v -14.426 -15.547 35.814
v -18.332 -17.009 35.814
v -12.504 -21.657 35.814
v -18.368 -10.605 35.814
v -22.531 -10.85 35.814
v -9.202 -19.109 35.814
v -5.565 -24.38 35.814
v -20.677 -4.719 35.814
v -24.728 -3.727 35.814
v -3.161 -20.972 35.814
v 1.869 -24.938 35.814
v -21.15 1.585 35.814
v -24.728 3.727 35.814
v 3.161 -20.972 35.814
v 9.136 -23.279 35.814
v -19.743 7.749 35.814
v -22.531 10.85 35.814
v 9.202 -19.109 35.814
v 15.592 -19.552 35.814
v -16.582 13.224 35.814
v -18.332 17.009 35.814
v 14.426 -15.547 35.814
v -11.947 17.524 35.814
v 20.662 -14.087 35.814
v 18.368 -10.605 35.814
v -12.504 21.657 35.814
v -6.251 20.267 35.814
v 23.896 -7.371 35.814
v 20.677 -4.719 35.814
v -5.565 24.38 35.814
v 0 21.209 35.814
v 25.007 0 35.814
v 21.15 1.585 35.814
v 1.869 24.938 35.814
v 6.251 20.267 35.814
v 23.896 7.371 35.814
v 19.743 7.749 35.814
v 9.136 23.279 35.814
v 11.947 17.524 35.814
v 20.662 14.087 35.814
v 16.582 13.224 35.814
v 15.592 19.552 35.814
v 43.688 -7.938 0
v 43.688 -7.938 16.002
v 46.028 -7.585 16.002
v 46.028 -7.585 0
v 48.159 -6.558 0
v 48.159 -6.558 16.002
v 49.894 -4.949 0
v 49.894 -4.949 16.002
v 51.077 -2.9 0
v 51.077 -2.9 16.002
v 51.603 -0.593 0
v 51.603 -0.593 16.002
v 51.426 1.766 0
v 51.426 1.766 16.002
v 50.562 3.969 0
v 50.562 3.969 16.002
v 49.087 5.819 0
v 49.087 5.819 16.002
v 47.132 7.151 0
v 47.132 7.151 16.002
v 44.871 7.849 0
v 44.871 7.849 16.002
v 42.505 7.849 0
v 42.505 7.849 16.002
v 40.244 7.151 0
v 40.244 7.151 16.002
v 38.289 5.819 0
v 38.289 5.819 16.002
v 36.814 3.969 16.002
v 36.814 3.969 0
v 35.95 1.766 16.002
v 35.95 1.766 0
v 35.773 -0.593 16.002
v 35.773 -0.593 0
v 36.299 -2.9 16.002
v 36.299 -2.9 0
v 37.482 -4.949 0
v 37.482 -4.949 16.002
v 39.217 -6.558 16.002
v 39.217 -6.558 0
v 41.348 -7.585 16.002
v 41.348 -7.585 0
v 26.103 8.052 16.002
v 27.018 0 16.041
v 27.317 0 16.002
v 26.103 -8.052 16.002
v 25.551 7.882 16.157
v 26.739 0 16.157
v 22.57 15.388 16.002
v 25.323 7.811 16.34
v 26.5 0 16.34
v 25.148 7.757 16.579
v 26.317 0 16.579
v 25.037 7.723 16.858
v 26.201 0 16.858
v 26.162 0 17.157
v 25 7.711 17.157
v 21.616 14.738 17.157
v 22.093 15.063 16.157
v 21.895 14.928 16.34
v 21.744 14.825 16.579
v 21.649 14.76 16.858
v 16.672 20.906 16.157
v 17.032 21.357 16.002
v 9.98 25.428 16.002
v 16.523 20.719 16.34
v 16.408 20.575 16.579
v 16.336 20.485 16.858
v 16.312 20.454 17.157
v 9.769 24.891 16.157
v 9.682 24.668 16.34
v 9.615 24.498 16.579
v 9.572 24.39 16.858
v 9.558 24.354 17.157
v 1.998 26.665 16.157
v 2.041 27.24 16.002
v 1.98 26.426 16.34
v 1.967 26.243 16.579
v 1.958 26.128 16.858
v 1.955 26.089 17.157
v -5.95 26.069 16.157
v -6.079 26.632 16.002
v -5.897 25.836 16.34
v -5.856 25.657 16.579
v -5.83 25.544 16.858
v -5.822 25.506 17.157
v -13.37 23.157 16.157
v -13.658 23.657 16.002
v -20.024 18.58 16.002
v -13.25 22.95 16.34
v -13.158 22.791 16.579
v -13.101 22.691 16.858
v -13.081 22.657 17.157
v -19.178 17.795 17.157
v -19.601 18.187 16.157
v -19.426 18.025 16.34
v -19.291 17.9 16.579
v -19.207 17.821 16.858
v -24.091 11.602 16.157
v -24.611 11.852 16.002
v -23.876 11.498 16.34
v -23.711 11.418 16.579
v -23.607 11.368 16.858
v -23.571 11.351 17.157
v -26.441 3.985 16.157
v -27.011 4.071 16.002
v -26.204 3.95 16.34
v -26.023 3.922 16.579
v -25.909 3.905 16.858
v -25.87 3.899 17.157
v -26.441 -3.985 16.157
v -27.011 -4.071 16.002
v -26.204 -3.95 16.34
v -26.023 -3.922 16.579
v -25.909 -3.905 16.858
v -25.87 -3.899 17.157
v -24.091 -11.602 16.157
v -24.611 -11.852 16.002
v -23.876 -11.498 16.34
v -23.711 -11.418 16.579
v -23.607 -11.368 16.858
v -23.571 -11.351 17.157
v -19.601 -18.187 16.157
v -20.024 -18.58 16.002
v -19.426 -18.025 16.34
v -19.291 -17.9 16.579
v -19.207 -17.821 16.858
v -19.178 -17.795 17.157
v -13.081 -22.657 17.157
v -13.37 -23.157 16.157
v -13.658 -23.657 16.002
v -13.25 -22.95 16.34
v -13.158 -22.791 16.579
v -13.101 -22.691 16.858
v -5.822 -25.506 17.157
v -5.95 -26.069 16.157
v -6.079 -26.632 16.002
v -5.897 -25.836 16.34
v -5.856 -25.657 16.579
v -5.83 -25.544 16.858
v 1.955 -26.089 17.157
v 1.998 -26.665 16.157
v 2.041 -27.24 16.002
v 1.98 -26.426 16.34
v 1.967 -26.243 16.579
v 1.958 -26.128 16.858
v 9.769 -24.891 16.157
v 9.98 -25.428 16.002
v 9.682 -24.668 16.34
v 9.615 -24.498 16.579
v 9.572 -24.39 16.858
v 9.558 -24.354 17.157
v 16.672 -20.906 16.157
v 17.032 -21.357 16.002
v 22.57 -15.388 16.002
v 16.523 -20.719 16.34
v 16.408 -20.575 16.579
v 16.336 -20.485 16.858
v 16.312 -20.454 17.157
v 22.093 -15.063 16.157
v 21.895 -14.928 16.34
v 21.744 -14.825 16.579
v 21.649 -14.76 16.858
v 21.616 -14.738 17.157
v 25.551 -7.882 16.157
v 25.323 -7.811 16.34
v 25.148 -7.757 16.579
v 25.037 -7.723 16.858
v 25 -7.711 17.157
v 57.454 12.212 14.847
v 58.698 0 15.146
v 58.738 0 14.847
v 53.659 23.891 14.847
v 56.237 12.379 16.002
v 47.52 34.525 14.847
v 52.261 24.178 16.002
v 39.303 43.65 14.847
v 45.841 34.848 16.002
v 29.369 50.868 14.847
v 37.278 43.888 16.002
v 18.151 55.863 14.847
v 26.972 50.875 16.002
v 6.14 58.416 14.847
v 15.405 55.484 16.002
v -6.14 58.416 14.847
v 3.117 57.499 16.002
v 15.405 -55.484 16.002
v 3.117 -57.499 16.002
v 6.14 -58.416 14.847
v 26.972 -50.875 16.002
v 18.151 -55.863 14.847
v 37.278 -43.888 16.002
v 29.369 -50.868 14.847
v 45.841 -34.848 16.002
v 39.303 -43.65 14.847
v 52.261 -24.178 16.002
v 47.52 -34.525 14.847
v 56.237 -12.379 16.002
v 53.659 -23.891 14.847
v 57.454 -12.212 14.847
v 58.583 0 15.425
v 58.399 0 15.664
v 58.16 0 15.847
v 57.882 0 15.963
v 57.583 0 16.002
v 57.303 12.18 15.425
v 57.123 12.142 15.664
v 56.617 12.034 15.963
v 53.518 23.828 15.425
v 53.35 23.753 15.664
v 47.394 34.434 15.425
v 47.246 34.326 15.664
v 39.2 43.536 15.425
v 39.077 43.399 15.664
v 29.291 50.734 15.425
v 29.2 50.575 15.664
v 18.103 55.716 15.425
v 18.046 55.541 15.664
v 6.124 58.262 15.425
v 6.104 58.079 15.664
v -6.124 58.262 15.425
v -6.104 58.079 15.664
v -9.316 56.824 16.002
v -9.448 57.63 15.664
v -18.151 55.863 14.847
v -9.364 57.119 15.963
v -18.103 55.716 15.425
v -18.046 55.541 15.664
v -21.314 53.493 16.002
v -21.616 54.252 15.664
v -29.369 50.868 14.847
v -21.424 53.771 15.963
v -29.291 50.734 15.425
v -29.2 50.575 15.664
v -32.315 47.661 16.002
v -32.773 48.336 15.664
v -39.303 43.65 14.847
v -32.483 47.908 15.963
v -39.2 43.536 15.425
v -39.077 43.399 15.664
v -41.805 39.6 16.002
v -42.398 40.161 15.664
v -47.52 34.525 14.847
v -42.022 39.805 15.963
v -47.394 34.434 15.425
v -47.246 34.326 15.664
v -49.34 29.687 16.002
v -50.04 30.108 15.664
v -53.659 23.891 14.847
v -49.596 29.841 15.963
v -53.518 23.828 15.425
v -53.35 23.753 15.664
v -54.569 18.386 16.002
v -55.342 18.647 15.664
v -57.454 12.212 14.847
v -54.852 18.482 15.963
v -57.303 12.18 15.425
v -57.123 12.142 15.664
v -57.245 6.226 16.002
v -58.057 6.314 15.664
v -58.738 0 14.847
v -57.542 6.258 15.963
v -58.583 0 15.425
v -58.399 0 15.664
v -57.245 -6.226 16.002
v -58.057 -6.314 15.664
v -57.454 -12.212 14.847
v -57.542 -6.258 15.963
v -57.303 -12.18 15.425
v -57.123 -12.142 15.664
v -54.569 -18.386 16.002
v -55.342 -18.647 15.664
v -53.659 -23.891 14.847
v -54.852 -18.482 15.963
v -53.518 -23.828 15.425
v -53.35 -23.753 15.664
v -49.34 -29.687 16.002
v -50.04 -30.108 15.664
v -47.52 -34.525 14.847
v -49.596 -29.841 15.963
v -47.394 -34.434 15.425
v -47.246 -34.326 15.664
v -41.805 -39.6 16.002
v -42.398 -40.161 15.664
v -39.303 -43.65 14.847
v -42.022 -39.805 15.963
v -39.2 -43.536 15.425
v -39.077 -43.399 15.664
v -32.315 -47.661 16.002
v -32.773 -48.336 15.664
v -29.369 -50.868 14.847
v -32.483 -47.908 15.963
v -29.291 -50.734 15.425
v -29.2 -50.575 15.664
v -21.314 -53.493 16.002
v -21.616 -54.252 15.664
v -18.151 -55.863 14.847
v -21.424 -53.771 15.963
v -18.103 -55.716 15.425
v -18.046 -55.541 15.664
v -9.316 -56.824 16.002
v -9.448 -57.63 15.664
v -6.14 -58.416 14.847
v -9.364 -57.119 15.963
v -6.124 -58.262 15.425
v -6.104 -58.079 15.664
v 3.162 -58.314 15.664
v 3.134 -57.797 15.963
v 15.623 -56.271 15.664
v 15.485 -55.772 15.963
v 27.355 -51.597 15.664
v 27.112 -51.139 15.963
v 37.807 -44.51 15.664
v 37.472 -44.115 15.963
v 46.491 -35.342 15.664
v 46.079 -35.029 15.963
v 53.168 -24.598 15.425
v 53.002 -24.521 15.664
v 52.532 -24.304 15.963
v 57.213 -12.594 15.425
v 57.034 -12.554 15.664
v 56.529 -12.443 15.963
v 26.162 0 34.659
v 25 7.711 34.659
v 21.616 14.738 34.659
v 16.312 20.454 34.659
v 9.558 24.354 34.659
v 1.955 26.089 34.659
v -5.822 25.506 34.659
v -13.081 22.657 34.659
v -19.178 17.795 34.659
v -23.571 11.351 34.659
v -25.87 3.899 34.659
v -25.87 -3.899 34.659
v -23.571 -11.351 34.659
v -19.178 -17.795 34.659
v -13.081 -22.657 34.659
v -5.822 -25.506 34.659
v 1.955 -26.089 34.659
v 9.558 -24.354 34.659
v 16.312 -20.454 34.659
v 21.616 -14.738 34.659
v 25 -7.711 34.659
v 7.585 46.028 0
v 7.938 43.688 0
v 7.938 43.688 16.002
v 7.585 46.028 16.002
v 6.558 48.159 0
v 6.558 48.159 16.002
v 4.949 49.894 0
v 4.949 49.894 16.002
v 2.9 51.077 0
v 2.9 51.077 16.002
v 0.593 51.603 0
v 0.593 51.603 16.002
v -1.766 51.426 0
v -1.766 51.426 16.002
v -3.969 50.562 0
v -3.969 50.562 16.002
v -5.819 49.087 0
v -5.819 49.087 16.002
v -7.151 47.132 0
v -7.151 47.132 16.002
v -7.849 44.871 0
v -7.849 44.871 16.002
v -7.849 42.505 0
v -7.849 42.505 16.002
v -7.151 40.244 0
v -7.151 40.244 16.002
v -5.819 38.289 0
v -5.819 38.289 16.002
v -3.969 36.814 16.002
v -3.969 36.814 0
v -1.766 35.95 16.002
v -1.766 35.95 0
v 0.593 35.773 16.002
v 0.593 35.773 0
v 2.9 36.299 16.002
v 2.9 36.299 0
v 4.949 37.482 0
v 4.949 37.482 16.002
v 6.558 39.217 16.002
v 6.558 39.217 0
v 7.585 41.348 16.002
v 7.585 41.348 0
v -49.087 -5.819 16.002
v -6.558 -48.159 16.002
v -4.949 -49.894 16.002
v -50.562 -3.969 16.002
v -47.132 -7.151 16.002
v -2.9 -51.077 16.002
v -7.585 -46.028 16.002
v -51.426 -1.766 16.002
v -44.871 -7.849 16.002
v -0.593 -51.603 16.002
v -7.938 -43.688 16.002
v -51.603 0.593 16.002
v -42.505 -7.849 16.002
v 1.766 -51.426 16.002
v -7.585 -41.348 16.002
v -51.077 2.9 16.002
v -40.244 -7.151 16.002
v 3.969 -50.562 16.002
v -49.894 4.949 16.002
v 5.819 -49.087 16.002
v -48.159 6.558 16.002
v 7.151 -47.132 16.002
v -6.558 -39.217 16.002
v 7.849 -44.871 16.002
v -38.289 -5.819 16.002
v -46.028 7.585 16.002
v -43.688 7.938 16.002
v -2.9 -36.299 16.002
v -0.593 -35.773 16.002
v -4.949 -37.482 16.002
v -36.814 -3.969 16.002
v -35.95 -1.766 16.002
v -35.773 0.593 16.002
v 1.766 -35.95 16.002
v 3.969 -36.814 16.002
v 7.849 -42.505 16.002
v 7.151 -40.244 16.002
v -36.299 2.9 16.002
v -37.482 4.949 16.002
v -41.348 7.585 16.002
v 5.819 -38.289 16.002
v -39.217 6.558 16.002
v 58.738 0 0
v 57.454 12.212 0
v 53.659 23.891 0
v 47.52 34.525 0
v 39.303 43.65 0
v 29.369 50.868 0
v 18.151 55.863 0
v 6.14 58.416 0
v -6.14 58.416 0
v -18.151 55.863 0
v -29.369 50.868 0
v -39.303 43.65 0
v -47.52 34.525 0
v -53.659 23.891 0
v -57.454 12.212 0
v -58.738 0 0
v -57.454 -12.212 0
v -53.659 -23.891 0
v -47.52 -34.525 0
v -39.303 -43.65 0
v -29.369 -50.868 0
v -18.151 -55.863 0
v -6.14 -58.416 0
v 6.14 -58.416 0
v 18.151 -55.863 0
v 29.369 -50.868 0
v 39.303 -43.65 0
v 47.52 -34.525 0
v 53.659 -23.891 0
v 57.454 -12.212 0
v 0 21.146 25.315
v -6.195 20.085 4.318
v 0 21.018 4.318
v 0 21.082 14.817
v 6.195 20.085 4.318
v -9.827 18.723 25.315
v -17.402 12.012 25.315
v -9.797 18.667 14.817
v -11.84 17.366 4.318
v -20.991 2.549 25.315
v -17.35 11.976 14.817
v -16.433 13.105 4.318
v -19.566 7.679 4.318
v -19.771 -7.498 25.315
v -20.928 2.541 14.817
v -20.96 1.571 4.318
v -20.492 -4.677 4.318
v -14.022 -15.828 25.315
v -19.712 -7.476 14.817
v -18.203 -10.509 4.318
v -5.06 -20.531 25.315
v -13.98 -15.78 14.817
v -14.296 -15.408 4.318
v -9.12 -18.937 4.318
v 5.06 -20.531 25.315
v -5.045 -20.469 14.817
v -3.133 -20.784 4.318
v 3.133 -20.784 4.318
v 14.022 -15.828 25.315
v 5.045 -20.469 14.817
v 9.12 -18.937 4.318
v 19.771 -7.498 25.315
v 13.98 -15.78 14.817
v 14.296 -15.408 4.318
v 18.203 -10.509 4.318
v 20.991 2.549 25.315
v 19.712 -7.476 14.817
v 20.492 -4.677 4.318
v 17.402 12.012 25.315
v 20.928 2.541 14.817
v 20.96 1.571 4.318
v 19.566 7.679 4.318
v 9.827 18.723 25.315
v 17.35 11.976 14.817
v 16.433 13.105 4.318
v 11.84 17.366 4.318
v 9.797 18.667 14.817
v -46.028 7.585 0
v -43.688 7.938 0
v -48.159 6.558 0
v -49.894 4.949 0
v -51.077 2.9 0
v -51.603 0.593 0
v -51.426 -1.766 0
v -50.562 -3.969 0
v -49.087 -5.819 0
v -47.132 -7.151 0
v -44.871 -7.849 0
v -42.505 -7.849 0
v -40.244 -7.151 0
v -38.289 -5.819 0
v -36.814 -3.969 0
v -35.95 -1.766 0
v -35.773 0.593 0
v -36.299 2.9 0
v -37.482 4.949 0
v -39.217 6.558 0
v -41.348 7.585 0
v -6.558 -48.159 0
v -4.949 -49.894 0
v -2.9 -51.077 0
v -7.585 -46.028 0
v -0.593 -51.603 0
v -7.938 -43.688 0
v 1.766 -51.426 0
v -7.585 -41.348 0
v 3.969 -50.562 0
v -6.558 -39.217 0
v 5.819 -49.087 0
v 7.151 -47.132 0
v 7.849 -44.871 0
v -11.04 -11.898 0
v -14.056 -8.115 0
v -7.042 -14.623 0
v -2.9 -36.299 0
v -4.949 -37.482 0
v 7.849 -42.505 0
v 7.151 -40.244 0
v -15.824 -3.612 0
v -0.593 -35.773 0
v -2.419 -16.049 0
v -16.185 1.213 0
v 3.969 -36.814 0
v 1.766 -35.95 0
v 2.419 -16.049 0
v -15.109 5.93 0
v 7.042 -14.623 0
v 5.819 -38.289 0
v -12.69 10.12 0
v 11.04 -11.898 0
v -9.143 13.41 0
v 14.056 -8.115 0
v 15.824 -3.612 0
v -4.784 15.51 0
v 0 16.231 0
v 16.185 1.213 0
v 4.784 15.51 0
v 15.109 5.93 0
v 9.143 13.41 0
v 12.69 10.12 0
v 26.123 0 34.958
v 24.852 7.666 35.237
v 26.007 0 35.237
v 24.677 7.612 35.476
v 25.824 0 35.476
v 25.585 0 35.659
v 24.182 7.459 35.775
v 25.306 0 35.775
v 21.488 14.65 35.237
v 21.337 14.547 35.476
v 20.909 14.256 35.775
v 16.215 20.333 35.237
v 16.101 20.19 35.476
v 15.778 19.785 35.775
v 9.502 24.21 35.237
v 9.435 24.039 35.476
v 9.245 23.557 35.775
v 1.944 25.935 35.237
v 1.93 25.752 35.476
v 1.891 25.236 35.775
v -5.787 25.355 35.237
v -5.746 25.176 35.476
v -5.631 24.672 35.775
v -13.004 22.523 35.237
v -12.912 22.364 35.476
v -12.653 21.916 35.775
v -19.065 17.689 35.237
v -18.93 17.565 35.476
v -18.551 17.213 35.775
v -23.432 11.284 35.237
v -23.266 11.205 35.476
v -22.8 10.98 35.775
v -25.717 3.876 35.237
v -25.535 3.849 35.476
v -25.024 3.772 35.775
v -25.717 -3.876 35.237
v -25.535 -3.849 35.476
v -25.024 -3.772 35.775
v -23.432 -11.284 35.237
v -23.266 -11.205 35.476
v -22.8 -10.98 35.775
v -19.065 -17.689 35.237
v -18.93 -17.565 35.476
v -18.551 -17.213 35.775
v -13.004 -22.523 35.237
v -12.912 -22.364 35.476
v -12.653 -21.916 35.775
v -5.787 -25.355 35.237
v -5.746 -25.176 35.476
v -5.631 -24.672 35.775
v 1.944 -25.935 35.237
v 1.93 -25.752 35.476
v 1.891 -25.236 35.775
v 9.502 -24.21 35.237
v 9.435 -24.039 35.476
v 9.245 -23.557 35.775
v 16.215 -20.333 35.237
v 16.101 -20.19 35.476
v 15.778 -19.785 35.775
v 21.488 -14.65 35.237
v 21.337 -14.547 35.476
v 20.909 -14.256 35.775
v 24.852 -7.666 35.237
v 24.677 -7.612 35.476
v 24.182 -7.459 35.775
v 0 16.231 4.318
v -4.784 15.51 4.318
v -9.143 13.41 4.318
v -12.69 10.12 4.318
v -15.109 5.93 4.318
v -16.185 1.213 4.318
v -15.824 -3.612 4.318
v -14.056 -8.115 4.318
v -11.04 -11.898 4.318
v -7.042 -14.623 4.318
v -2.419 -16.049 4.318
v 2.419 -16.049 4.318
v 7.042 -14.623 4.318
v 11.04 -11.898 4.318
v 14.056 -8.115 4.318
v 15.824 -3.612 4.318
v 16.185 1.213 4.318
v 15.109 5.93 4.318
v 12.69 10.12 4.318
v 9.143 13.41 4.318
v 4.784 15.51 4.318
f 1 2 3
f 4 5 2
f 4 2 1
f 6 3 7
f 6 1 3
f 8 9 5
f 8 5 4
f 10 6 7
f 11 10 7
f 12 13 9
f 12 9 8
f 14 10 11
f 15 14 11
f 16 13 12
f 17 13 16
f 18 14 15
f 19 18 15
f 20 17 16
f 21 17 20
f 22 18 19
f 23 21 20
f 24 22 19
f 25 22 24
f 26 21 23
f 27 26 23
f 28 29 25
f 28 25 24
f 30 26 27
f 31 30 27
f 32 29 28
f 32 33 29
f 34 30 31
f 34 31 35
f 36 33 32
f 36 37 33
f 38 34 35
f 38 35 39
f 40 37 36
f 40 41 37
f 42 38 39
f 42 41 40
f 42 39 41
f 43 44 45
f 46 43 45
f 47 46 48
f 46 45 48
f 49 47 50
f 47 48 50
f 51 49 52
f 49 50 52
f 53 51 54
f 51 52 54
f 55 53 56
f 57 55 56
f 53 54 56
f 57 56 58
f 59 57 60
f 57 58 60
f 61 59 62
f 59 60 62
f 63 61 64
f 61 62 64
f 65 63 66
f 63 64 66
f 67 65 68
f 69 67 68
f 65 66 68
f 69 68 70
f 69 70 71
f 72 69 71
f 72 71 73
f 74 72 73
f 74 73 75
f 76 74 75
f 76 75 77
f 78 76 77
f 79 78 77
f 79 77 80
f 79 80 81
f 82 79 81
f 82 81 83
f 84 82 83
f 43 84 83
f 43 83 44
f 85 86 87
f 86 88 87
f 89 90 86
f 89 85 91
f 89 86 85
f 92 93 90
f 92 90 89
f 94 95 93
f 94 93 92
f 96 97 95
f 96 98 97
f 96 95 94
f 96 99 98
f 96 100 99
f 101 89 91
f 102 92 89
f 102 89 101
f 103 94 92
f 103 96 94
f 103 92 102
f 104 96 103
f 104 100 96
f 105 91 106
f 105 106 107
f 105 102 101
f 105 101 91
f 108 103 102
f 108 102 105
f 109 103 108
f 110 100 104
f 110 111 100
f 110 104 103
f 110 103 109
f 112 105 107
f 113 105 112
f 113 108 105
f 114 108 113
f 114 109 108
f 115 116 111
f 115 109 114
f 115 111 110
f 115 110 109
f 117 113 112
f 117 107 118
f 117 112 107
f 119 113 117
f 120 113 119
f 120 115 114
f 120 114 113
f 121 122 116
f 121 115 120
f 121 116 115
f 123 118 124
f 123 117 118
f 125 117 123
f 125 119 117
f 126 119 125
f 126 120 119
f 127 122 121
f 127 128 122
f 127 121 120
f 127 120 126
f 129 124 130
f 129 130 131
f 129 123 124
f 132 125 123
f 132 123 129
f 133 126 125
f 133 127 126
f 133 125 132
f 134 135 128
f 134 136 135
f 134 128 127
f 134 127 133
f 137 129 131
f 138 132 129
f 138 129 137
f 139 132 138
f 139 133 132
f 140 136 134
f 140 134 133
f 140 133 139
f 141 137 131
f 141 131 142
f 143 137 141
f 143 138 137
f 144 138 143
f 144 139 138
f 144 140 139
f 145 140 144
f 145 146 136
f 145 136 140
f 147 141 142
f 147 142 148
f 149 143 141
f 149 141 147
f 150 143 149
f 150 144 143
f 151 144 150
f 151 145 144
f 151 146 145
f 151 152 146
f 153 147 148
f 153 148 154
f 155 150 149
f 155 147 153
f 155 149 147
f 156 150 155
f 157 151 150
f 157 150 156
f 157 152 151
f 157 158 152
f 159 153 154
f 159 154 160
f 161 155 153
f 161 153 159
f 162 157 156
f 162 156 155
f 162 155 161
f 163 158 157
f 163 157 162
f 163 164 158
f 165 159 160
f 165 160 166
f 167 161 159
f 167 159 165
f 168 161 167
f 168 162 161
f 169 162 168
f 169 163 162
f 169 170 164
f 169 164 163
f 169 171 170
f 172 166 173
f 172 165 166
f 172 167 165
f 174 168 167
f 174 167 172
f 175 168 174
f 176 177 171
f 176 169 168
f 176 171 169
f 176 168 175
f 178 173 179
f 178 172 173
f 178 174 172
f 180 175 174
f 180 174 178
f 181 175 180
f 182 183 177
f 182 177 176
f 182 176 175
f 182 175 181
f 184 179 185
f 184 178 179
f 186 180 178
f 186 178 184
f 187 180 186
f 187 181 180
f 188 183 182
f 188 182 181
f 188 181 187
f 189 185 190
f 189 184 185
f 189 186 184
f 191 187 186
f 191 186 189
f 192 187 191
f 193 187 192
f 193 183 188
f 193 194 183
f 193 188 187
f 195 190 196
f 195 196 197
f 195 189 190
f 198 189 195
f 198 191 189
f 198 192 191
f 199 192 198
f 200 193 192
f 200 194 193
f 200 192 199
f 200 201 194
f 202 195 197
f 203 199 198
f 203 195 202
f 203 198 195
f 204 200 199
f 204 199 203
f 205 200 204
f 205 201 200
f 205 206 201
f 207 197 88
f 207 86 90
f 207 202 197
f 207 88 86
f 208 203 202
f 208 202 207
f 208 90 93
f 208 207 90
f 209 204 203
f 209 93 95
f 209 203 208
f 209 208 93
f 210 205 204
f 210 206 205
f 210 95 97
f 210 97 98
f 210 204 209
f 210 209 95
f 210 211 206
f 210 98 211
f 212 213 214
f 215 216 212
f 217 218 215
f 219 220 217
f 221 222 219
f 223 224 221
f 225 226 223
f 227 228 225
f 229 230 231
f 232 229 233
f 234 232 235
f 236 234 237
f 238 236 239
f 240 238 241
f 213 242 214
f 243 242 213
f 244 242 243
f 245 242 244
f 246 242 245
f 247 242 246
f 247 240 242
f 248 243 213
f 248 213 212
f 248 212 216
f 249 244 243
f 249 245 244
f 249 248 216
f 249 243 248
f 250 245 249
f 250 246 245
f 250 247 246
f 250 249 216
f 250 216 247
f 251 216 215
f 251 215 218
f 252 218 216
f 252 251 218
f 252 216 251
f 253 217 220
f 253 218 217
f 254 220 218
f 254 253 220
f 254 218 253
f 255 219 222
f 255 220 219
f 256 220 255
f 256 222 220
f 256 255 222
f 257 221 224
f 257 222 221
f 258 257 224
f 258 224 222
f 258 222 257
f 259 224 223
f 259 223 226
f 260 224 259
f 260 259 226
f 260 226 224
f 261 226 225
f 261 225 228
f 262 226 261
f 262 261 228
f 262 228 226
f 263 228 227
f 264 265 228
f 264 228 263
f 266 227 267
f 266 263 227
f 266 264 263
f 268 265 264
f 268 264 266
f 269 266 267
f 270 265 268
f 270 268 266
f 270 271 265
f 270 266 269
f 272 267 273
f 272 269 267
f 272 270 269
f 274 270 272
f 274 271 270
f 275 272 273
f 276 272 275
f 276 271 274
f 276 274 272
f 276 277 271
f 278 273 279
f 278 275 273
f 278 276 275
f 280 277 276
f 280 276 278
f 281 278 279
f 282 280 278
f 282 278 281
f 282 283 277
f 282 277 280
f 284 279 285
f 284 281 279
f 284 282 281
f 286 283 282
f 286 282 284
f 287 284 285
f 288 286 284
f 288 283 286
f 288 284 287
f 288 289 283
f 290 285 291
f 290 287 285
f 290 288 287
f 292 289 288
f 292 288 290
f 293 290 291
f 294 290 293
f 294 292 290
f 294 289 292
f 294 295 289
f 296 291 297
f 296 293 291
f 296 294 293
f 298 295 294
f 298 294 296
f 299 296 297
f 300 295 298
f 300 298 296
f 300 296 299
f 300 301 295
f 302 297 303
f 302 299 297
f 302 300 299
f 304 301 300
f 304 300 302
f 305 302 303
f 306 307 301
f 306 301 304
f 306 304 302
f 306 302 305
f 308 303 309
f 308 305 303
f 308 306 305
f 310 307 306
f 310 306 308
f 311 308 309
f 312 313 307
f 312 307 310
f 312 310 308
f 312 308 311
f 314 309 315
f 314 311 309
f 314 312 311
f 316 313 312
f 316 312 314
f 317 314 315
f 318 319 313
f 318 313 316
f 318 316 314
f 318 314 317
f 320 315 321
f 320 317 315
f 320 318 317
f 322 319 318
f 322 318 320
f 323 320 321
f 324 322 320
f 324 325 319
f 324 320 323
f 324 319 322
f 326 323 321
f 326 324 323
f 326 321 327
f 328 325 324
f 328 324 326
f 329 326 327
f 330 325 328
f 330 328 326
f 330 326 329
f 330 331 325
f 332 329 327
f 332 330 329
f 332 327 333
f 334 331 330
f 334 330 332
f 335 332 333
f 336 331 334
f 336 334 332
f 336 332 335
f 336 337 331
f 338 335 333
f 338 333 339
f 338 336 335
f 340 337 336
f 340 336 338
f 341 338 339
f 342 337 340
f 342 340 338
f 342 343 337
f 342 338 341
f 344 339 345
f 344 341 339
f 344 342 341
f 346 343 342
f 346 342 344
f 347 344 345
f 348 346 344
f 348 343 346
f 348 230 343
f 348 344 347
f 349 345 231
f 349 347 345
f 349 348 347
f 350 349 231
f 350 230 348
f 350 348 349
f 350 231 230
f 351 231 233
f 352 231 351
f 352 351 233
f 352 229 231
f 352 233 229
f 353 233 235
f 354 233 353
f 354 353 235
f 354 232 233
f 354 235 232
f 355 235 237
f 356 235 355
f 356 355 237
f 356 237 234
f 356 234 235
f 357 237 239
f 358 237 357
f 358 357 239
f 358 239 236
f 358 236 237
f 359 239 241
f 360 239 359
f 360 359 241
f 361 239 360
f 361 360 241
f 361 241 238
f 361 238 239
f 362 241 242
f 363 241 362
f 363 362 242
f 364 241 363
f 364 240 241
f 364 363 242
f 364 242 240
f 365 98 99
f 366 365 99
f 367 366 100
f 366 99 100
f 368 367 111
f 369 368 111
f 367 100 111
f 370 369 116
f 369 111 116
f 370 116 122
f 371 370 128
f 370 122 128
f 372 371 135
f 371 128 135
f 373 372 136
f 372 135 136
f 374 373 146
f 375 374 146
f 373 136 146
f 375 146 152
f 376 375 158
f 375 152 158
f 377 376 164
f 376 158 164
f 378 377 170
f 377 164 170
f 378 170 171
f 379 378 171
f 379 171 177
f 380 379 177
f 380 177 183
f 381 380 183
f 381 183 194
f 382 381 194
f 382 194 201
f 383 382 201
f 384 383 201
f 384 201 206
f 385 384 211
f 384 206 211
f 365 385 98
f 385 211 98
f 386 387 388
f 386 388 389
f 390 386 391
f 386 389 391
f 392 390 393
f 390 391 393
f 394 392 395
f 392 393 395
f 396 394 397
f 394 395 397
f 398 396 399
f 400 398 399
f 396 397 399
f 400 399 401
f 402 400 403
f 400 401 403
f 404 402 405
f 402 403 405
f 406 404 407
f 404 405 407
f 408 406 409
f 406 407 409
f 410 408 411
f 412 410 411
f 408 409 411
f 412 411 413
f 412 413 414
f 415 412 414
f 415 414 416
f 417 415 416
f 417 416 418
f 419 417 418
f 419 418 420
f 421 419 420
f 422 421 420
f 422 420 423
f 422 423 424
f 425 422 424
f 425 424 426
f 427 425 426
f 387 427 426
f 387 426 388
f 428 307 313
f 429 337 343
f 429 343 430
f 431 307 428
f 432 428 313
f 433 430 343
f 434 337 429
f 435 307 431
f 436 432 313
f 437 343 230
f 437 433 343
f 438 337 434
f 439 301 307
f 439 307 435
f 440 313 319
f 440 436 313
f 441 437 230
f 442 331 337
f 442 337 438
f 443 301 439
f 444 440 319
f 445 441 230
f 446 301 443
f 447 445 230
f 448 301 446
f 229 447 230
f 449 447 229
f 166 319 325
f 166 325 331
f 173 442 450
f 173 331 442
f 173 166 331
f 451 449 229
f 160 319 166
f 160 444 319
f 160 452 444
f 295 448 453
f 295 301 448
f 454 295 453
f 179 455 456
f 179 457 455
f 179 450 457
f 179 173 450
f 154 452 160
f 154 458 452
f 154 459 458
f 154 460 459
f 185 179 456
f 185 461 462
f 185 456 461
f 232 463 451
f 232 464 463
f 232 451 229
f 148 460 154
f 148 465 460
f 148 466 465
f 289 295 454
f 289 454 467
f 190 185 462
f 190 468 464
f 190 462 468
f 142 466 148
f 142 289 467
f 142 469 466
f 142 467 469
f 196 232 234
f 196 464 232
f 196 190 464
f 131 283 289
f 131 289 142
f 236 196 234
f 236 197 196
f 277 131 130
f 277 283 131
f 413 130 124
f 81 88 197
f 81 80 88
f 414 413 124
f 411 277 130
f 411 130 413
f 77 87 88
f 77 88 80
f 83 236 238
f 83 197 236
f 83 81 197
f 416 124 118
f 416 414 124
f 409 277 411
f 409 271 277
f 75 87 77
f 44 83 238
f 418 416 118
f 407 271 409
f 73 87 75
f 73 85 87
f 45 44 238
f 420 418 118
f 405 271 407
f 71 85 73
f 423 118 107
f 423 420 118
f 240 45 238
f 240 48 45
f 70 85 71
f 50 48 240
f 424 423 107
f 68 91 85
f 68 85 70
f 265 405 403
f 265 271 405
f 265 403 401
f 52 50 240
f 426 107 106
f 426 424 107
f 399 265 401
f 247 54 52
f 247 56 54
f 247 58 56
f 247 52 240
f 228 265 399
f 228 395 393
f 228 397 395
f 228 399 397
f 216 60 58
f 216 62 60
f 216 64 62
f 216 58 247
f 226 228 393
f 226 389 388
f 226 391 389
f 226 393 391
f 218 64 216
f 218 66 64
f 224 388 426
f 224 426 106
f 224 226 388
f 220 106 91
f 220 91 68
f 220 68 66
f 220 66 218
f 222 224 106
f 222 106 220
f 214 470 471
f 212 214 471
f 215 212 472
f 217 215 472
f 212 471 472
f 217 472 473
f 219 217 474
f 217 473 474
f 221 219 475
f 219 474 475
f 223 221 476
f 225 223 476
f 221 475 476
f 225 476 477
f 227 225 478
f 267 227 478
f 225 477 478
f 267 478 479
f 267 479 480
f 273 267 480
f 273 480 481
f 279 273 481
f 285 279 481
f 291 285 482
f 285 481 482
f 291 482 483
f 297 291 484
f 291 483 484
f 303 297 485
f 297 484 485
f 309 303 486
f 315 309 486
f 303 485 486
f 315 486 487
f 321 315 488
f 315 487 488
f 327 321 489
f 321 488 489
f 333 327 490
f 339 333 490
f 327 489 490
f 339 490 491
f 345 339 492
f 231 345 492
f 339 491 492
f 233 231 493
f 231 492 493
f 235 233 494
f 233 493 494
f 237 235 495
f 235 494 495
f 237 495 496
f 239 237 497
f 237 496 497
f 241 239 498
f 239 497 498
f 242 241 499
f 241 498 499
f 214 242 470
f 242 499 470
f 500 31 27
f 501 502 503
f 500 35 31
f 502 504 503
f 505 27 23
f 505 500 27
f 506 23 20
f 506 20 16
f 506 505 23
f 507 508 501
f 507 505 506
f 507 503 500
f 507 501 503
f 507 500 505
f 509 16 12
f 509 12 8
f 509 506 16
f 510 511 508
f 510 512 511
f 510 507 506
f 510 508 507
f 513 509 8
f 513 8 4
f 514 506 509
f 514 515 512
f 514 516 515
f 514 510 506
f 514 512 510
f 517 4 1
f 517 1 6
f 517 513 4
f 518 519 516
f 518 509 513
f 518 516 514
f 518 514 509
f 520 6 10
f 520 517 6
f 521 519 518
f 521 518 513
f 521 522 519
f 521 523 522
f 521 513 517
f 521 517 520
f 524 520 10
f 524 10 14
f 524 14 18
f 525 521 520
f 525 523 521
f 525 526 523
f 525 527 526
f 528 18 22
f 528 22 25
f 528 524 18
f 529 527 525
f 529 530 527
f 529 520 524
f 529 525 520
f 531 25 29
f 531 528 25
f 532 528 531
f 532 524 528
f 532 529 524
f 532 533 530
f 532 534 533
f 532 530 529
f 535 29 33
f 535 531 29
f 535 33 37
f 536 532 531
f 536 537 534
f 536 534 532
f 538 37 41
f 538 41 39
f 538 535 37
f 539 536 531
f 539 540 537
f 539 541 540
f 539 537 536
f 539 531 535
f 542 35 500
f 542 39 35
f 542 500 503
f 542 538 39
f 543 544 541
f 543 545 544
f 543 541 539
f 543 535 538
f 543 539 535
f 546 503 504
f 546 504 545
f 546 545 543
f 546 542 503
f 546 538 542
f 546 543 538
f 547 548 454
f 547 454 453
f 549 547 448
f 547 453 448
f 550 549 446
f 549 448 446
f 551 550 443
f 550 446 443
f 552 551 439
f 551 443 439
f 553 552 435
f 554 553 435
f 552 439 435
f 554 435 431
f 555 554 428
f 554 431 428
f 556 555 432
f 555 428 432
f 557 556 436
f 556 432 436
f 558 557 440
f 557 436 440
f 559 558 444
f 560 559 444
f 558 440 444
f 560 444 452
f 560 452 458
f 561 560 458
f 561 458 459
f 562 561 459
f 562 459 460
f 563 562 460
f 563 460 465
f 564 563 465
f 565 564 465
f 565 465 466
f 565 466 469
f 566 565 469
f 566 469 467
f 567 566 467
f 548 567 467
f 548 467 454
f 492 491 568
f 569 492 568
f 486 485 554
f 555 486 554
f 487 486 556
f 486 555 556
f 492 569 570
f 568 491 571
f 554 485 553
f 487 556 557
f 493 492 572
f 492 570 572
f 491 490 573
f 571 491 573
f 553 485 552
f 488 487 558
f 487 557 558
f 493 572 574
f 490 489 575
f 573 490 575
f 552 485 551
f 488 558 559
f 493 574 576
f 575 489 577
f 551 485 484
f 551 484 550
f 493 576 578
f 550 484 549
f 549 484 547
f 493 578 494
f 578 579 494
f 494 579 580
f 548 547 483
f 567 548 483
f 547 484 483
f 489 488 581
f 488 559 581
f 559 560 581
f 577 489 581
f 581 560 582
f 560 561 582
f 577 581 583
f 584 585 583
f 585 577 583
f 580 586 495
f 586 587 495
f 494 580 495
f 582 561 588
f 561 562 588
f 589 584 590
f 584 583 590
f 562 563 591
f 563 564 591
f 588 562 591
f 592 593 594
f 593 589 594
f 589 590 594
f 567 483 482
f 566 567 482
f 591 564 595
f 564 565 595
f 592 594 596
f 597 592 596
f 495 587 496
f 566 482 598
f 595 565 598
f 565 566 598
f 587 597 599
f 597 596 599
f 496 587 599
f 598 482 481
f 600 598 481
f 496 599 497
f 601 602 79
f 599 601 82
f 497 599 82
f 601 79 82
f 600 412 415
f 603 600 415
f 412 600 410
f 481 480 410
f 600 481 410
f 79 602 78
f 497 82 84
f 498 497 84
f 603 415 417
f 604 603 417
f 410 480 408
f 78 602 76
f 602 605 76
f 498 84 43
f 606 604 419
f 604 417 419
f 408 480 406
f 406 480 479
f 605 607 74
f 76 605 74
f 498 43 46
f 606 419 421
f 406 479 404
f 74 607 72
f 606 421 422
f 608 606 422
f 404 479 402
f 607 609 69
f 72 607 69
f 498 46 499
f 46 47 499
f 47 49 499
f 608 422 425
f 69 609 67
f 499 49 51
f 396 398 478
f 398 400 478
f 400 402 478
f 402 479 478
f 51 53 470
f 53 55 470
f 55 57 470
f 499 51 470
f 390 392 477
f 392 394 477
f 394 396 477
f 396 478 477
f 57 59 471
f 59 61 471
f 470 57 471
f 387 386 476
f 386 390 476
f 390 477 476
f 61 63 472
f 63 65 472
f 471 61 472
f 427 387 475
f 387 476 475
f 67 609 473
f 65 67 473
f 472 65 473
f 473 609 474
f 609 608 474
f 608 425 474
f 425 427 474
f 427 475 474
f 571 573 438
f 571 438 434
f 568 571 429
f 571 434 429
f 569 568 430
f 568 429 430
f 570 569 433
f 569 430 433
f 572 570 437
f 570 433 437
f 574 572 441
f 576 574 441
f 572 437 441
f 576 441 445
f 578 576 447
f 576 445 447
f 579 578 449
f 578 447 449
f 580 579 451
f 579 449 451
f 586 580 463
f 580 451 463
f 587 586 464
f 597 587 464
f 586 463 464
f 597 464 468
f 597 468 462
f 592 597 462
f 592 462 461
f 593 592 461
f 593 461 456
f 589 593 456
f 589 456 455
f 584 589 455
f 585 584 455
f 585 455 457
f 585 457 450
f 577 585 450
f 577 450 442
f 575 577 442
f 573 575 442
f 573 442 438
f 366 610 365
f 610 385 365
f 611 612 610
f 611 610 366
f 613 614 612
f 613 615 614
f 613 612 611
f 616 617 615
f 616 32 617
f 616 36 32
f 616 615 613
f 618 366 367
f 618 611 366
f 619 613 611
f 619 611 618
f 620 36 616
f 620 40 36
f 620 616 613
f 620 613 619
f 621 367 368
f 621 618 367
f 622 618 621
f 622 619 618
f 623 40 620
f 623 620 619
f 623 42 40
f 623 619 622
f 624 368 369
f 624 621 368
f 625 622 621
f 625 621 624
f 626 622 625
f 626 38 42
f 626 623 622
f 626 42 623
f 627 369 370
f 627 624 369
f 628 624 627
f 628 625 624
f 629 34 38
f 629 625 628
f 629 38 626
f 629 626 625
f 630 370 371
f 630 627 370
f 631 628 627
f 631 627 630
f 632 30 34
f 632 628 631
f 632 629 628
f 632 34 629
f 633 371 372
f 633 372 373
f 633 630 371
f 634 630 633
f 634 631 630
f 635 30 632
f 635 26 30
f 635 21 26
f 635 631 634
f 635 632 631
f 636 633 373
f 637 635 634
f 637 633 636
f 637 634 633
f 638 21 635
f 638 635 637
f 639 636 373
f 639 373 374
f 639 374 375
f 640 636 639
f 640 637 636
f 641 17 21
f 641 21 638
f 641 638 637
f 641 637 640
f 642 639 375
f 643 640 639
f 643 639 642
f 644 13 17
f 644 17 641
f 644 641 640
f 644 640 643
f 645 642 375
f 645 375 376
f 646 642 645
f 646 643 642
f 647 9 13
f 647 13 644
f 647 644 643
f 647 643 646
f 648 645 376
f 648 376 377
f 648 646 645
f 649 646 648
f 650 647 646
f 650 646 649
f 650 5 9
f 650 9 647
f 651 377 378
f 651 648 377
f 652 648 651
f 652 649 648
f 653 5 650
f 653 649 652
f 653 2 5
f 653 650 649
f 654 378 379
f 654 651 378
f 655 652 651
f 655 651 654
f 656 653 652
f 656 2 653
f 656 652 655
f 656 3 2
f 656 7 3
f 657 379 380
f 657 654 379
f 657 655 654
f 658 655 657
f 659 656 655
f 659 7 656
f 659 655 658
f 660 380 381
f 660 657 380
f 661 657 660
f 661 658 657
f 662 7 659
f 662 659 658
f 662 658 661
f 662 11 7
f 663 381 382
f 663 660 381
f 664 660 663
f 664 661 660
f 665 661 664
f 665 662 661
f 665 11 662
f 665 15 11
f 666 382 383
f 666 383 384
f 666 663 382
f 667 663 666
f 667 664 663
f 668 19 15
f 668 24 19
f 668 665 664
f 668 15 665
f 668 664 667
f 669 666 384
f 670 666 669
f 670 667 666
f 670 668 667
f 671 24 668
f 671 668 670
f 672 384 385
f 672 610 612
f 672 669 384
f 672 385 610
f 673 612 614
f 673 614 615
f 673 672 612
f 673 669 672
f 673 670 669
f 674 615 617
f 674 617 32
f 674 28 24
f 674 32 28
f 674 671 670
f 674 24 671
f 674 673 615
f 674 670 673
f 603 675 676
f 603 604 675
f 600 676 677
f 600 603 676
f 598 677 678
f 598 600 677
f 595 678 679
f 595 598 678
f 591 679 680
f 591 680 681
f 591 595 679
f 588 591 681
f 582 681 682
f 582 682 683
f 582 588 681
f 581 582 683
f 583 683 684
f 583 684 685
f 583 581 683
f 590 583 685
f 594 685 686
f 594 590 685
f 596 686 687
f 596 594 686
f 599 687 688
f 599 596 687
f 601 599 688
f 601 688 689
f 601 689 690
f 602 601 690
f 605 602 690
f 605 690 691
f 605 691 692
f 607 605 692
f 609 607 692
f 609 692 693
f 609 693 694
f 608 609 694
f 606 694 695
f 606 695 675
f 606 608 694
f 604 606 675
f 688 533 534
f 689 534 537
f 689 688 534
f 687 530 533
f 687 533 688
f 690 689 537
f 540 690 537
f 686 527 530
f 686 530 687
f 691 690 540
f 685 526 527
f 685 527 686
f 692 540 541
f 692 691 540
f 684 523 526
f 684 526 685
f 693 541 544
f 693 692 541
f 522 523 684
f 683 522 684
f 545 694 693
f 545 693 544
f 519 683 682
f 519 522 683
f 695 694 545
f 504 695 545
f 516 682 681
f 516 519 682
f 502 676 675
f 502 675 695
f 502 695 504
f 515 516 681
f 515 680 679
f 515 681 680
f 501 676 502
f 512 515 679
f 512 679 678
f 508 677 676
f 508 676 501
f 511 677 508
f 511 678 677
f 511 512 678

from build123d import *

# Parameters (mm, degrees)
SKETCH1_R         = 58.7375
EXTRUDE1_DEPTH    = 16.002
SKETCH2_R         = 26.162
EXTRUDE2_DEPTH    = 19.812
SKETCH3_R         = 7.9375
EXTRUDE3_DEPTH    = 86.39732523
CIRPATTERN1_COUNT = 4
FILLET1_R         = 1.154545455


with BuildPart() as part:
    # Sketch1 → Extrude1 (new body)
    with BuildSketch(Plane.XY):
        Circle(SKETCH1_R)
    extrude(amount=EXTRUDE1_DEPTH)

    # Sketch2 → Extrude2 (add)
    with BuildSketch(Plane.XY.offset(16.002)):
        Circle(SKETCH2_R)
    extrude(amount=EXTRUDE2_DEPTH)

    # Sketch3 → Extrude3 (cut, through all)
    with BuildSketch(Plane.XY.offset(16.002)):
        with Locations((0, 43.688)):
            Circle(SKETCH3_R)
    extrude3 = extrude(amount=-EXTRUDE3_DEPTH, mode=Mode.SUBTRACT)

    # CirPattern1: Extrude3 ×4 about axis
    cirpattern1_axis = Axis((0, 0, 0), (0, 0, 1))
    for i in range(1, CIRPATTERN1_COUNT):
        add(extrude3.rotate(cirpattern1_axis, i * 360 / CIRPATTERN1_COUNT), mode=Mode.SUBTRACT)

    # Fillet1
    fillet1_edges = [part.edges().sort_by_distance(p)[0] for p in [
        (-58.7375, 0, 16.002),
        (-26.162, 0, 16.002),
        (-26.162, 0, 35.814),
    ]]
    fillet(fillet1_edges, radius=FILLET1_R)

    # Sketch4 → Cut-Revolve1 (revolve, cut)
    with BuildSketch(Plane(origin=(0, 0, 63.5), x_dir=(0, 0, -1), z_dir=(1, 0, 0))):
        Polygon((27.686, 21.209), (59.182, 21.0185), (59.182, 16.2306), (63.5, 16.2306), (63.5, 0), (27.686, 0), align=None)
    revolve(axis=Axis((0, 0, 0), (0, 0, 1)), mode=Mode.SUBTRACT)


solid = part.part
